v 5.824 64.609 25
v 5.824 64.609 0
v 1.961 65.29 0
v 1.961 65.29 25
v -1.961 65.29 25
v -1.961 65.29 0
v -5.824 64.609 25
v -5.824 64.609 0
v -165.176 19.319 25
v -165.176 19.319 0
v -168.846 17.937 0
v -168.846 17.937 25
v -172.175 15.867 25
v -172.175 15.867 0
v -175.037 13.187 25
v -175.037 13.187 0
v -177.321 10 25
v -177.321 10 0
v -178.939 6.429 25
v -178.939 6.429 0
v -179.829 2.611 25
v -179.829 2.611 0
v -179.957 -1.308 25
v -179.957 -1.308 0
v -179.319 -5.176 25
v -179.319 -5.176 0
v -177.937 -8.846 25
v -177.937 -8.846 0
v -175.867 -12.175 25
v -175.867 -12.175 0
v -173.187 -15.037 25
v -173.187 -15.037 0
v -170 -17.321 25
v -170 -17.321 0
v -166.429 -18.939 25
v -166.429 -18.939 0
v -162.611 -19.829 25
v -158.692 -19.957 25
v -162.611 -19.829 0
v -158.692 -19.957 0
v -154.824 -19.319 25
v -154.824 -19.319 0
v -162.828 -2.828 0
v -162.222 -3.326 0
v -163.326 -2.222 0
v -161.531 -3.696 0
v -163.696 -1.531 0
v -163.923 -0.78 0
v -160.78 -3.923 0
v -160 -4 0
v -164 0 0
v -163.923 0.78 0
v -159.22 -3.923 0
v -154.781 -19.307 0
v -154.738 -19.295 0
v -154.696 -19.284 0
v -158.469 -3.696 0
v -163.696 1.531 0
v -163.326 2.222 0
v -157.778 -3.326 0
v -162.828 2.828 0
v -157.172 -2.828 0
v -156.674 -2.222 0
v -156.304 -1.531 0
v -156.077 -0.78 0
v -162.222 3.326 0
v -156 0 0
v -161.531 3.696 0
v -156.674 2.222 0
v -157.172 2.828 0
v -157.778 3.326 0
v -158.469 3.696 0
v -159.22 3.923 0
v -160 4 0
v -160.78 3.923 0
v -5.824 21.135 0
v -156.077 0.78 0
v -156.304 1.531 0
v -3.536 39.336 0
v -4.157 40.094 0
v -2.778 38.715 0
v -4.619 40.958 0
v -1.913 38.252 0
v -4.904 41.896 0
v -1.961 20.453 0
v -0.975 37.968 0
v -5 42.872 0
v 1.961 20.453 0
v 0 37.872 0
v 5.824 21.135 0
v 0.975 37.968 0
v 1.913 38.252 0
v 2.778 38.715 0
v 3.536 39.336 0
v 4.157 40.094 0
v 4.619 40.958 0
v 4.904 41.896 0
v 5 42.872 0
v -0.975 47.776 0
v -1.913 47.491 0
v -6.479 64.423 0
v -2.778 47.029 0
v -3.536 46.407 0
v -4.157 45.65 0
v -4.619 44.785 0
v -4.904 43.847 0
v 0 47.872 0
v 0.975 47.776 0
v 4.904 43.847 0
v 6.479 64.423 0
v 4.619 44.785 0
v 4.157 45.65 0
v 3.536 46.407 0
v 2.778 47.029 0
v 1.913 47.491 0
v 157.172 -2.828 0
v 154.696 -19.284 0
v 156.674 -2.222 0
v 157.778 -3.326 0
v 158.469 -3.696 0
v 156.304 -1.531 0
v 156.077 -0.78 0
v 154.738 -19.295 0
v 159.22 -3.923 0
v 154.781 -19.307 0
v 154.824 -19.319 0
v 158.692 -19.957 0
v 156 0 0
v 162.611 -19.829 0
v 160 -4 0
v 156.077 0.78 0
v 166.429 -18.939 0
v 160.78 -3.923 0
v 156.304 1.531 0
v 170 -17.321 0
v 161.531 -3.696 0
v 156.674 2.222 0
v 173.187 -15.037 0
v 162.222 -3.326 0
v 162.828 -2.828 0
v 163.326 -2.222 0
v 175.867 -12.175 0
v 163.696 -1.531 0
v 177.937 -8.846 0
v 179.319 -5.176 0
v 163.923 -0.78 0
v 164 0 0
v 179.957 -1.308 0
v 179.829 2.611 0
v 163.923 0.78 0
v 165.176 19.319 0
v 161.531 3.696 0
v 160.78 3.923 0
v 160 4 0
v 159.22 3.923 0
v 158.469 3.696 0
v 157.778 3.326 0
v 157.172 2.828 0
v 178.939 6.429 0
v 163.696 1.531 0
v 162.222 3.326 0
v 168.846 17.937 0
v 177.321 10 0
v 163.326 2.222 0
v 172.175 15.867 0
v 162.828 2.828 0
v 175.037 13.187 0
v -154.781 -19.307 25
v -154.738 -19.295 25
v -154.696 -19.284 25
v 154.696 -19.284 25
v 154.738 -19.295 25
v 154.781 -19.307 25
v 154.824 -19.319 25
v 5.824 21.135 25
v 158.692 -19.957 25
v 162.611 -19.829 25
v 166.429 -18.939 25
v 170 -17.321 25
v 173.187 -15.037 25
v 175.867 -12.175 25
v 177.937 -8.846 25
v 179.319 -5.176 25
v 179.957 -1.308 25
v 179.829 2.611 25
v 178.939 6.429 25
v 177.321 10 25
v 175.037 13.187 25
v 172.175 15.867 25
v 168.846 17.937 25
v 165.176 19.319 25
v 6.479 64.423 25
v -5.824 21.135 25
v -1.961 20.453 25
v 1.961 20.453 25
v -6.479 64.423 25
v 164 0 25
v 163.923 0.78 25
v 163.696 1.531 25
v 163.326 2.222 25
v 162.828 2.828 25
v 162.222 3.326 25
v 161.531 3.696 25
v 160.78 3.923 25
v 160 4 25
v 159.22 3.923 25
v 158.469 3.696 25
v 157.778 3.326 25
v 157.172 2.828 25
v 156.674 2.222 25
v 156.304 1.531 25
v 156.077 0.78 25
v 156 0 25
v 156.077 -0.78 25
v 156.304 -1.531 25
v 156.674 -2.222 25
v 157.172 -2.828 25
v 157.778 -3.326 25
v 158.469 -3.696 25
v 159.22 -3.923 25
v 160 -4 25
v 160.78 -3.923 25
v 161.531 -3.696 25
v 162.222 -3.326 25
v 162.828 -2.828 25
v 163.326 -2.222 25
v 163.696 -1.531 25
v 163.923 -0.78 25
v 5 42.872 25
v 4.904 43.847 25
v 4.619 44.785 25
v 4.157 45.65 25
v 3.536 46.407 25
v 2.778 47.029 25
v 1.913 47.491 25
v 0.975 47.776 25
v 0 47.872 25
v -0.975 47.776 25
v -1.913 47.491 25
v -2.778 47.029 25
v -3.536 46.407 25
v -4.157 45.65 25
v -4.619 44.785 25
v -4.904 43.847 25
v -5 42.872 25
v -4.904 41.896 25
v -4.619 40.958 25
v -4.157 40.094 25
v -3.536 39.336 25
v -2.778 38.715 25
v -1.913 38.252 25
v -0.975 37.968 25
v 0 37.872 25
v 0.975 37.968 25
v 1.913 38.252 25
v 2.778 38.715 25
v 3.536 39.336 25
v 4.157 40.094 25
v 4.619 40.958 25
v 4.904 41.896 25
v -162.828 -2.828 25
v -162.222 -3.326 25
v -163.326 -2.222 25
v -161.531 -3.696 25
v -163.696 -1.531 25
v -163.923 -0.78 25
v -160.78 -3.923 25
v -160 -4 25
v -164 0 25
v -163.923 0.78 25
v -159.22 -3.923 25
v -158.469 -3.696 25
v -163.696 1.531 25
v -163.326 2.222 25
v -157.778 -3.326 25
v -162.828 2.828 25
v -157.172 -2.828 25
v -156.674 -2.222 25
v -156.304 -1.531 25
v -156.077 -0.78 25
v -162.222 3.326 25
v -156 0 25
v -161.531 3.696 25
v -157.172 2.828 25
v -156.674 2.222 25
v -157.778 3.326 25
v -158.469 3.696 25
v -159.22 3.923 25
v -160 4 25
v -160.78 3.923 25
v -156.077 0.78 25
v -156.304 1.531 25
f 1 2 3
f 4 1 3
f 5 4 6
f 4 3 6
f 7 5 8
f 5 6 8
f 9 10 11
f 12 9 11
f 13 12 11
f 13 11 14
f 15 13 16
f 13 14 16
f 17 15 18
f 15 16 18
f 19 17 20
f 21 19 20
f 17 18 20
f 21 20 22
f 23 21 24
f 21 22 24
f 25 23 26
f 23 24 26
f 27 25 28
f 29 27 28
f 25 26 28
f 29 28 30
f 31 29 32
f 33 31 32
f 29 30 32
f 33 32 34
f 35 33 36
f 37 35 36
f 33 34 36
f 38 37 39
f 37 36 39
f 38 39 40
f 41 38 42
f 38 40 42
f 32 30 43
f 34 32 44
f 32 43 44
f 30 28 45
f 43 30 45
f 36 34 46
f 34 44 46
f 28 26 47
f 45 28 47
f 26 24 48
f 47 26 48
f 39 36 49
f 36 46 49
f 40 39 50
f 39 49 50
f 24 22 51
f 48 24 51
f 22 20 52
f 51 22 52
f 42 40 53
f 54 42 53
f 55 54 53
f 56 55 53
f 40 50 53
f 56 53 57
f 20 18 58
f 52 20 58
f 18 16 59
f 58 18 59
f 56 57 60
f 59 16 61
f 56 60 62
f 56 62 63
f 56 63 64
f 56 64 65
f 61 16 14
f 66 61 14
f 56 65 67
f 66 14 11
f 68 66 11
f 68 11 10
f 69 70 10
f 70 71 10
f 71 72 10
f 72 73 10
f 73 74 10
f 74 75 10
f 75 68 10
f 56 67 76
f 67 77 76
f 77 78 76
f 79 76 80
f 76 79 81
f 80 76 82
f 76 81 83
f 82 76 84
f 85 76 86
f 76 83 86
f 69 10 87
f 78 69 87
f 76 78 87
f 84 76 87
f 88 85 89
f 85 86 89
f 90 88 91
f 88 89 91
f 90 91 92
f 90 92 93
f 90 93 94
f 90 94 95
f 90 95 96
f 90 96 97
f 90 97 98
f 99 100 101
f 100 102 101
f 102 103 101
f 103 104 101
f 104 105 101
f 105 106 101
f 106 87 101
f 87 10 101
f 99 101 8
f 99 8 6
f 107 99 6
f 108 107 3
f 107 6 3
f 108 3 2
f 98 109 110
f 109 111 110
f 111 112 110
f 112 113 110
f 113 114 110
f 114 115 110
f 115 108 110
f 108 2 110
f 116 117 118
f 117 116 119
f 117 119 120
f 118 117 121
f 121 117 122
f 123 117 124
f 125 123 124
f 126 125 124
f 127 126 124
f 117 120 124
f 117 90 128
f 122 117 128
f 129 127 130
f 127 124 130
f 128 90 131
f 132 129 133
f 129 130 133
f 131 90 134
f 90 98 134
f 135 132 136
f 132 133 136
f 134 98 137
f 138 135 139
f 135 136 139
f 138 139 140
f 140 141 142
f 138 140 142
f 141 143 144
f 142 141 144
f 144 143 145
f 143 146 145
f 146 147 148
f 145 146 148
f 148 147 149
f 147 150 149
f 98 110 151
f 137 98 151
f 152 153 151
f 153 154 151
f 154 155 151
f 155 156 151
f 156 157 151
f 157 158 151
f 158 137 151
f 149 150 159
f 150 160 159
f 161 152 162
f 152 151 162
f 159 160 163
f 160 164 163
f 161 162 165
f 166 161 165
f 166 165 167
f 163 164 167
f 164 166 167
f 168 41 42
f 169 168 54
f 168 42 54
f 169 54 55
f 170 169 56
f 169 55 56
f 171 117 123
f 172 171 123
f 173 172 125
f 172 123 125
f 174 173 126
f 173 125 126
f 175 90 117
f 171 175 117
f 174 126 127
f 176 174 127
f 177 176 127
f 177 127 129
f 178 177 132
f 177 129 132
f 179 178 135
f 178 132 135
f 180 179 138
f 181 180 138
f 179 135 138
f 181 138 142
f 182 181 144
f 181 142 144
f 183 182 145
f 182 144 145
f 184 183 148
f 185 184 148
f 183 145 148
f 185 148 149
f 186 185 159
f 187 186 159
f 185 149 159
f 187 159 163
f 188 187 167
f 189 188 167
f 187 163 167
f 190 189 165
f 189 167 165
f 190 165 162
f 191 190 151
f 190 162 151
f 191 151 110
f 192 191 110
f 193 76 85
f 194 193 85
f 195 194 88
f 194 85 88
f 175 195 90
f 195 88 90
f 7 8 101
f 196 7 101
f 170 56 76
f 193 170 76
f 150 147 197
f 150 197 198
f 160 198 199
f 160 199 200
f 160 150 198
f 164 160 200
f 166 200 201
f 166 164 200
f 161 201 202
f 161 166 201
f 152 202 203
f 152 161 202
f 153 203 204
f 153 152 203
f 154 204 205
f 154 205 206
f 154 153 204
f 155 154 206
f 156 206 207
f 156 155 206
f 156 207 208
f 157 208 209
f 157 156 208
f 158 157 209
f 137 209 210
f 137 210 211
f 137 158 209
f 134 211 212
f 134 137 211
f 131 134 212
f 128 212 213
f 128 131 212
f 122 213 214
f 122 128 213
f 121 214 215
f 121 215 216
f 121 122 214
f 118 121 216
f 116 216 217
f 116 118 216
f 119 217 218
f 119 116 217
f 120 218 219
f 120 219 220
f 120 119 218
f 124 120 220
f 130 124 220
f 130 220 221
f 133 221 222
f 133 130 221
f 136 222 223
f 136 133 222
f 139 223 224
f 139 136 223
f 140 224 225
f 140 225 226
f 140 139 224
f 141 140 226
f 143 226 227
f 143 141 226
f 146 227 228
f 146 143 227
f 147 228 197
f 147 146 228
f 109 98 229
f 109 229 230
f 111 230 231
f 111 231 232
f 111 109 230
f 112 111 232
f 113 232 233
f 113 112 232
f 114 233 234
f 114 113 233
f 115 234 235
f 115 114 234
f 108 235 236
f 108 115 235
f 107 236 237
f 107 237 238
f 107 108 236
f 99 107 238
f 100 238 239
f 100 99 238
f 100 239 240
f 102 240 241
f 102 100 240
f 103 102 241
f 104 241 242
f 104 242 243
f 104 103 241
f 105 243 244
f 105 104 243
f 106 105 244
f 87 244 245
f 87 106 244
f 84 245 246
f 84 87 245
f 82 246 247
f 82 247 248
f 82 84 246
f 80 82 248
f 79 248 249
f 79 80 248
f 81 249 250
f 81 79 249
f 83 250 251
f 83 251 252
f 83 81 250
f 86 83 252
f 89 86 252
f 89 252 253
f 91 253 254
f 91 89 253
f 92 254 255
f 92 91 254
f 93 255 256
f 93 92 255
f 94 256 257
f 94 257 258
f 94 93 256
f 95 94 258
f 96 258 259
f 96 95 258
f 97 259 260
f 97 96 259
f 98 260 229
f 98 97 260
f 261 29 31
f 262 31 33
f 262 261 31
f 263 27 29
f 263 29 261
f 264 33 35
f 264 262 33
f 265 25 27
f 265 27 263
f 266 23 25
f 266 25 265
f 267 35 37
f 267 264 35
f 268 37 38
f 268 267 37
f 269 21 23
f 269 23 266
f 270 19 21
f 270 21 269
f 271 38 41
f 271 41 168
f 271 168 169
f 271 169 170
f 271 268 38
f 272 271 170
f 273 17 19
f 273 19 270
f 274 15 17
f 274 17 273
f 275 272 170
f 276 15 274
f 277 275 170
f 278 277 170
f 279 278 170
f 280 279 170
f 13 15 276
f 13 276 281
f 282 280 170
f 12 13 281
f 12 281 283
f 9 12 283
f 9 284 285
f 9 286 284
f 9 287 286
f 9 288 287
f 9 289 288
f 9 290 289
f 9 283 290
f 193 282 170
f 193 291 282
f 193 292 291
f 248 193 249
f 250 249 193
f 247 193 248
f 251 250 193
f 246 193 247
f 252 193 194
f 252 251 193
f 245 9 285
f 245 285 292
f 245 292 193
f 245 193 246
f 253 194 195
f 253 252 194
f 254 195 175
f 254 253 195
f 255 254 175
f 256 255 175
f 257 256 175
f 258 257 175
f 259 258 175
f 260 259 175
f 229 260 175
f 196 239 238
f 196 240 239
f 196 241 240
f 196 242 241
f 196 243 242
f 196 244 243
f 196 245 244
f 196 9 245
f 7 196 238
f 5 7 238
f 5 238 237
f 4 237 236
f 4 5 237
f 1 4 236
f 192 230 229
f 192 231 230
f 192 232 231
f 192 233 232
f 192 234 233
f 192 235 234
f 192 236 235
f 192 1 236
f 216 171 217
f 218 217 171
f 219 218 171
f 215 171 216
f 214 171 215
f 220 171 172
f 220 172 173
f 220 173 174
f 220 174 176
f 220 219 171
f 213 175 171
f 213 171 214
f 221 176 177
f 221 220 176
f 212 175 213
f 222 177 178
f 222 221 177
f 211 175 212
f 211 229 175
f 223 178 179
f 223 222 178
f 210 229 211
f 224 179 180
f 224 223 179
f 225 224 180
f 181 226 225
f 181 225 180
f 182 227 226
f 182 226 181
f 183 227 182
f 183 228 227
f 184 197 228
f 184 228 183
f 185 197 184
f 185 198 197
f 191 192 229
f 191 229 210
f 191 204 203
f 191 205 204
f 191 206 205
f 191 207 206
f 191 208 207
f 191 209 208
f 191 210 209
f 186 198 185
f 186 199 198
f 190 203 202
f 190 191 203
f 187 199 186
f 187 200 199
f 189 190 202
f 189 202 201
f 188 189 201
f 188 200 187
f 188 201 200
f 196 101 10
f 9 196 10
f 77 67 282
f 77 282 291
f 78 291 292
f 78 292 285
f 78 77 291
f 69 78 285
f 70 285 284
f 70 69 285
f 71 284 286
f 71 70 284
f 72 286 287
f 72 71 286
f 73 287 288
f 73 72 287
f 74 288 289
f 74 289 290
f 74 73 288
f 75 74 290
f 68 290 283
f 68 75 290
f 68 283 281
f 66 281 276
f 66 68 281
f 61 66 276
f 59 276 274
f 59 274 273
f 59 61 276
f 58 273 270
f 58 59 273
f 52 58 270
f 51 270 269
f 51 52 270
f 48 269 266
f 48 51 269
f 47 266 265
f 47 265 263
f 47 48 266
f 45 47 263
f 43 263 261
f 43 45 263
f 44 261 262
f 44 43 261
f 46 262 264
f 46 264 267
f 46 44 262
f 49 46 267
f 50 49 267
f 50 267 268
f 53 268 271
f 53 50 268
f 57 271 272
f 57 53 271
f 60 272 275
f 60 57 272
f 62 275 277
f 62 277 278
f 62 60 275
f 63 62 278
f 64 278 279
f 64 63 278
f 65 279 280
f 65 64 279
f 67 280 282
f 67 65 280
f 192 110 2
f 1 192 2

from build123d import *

# Parameters (mm, degrees)
F0_R     = 4
F0_R_2   = 5
F1_DEPTH = 25


with BuildPart() as f1:
    # F0 (on Top) → F1 (new body)
    with BuildSketch(Plane.XY):
        with BuildLine():
            Line((-6.478907, 64.423181), (-165.176381, 19.318517))
            ThreePointArc((-165.176381, 19.318517), (-179.318517, -5.176381), (-154.823619, -19.318517))
            ThreePointArc((-154.823619, -19.318517), (-154.759725, -19.301283), (-154.695889, -19.283838))
            Line((-154.695889, -19.283838), (-5.824494, 21.134565))
            ThreePointArc((-5.824494, 21.134565), (0, 20.367755), (5.824494, 21.134565))
            Line((5.824494, 21.134565), (154.695889, -19.283838))
            ThreePointArc((154.695889, -19.283838), (154.759725, -19.301283), (154.823619, -19.318517))
            ThreePointArc((154.823619, -19.318517), (179.318517, -5.176381), (165.176381, 19.318517))
            Line((165.176381, 19.318517), (6.478907, 64.423181))
            Line((6.478907, 64.423181), (5.824494, 64.609177))
            ThreePointArc((5.824494, 64.609177), (0, 65.375986), (-5.824494, 64.609177))
            Line((-5.824494, 64.609177), (-6.478907, 64.423181))
        make_face()
        with Locations((-160, 0)):
            Circle(F0_R, mode=Mode.SUBTRACT)
        with Locations((160, 0)):
            Circle(F0_R, mode=Mode.SUBTRACT)
        with Locations((0, 42.871871)):
            Circle(F0_R_2, mode=Mode.SUBTRACT)
    extrude(amount=F1_DEPTH)


solid = f1.part
